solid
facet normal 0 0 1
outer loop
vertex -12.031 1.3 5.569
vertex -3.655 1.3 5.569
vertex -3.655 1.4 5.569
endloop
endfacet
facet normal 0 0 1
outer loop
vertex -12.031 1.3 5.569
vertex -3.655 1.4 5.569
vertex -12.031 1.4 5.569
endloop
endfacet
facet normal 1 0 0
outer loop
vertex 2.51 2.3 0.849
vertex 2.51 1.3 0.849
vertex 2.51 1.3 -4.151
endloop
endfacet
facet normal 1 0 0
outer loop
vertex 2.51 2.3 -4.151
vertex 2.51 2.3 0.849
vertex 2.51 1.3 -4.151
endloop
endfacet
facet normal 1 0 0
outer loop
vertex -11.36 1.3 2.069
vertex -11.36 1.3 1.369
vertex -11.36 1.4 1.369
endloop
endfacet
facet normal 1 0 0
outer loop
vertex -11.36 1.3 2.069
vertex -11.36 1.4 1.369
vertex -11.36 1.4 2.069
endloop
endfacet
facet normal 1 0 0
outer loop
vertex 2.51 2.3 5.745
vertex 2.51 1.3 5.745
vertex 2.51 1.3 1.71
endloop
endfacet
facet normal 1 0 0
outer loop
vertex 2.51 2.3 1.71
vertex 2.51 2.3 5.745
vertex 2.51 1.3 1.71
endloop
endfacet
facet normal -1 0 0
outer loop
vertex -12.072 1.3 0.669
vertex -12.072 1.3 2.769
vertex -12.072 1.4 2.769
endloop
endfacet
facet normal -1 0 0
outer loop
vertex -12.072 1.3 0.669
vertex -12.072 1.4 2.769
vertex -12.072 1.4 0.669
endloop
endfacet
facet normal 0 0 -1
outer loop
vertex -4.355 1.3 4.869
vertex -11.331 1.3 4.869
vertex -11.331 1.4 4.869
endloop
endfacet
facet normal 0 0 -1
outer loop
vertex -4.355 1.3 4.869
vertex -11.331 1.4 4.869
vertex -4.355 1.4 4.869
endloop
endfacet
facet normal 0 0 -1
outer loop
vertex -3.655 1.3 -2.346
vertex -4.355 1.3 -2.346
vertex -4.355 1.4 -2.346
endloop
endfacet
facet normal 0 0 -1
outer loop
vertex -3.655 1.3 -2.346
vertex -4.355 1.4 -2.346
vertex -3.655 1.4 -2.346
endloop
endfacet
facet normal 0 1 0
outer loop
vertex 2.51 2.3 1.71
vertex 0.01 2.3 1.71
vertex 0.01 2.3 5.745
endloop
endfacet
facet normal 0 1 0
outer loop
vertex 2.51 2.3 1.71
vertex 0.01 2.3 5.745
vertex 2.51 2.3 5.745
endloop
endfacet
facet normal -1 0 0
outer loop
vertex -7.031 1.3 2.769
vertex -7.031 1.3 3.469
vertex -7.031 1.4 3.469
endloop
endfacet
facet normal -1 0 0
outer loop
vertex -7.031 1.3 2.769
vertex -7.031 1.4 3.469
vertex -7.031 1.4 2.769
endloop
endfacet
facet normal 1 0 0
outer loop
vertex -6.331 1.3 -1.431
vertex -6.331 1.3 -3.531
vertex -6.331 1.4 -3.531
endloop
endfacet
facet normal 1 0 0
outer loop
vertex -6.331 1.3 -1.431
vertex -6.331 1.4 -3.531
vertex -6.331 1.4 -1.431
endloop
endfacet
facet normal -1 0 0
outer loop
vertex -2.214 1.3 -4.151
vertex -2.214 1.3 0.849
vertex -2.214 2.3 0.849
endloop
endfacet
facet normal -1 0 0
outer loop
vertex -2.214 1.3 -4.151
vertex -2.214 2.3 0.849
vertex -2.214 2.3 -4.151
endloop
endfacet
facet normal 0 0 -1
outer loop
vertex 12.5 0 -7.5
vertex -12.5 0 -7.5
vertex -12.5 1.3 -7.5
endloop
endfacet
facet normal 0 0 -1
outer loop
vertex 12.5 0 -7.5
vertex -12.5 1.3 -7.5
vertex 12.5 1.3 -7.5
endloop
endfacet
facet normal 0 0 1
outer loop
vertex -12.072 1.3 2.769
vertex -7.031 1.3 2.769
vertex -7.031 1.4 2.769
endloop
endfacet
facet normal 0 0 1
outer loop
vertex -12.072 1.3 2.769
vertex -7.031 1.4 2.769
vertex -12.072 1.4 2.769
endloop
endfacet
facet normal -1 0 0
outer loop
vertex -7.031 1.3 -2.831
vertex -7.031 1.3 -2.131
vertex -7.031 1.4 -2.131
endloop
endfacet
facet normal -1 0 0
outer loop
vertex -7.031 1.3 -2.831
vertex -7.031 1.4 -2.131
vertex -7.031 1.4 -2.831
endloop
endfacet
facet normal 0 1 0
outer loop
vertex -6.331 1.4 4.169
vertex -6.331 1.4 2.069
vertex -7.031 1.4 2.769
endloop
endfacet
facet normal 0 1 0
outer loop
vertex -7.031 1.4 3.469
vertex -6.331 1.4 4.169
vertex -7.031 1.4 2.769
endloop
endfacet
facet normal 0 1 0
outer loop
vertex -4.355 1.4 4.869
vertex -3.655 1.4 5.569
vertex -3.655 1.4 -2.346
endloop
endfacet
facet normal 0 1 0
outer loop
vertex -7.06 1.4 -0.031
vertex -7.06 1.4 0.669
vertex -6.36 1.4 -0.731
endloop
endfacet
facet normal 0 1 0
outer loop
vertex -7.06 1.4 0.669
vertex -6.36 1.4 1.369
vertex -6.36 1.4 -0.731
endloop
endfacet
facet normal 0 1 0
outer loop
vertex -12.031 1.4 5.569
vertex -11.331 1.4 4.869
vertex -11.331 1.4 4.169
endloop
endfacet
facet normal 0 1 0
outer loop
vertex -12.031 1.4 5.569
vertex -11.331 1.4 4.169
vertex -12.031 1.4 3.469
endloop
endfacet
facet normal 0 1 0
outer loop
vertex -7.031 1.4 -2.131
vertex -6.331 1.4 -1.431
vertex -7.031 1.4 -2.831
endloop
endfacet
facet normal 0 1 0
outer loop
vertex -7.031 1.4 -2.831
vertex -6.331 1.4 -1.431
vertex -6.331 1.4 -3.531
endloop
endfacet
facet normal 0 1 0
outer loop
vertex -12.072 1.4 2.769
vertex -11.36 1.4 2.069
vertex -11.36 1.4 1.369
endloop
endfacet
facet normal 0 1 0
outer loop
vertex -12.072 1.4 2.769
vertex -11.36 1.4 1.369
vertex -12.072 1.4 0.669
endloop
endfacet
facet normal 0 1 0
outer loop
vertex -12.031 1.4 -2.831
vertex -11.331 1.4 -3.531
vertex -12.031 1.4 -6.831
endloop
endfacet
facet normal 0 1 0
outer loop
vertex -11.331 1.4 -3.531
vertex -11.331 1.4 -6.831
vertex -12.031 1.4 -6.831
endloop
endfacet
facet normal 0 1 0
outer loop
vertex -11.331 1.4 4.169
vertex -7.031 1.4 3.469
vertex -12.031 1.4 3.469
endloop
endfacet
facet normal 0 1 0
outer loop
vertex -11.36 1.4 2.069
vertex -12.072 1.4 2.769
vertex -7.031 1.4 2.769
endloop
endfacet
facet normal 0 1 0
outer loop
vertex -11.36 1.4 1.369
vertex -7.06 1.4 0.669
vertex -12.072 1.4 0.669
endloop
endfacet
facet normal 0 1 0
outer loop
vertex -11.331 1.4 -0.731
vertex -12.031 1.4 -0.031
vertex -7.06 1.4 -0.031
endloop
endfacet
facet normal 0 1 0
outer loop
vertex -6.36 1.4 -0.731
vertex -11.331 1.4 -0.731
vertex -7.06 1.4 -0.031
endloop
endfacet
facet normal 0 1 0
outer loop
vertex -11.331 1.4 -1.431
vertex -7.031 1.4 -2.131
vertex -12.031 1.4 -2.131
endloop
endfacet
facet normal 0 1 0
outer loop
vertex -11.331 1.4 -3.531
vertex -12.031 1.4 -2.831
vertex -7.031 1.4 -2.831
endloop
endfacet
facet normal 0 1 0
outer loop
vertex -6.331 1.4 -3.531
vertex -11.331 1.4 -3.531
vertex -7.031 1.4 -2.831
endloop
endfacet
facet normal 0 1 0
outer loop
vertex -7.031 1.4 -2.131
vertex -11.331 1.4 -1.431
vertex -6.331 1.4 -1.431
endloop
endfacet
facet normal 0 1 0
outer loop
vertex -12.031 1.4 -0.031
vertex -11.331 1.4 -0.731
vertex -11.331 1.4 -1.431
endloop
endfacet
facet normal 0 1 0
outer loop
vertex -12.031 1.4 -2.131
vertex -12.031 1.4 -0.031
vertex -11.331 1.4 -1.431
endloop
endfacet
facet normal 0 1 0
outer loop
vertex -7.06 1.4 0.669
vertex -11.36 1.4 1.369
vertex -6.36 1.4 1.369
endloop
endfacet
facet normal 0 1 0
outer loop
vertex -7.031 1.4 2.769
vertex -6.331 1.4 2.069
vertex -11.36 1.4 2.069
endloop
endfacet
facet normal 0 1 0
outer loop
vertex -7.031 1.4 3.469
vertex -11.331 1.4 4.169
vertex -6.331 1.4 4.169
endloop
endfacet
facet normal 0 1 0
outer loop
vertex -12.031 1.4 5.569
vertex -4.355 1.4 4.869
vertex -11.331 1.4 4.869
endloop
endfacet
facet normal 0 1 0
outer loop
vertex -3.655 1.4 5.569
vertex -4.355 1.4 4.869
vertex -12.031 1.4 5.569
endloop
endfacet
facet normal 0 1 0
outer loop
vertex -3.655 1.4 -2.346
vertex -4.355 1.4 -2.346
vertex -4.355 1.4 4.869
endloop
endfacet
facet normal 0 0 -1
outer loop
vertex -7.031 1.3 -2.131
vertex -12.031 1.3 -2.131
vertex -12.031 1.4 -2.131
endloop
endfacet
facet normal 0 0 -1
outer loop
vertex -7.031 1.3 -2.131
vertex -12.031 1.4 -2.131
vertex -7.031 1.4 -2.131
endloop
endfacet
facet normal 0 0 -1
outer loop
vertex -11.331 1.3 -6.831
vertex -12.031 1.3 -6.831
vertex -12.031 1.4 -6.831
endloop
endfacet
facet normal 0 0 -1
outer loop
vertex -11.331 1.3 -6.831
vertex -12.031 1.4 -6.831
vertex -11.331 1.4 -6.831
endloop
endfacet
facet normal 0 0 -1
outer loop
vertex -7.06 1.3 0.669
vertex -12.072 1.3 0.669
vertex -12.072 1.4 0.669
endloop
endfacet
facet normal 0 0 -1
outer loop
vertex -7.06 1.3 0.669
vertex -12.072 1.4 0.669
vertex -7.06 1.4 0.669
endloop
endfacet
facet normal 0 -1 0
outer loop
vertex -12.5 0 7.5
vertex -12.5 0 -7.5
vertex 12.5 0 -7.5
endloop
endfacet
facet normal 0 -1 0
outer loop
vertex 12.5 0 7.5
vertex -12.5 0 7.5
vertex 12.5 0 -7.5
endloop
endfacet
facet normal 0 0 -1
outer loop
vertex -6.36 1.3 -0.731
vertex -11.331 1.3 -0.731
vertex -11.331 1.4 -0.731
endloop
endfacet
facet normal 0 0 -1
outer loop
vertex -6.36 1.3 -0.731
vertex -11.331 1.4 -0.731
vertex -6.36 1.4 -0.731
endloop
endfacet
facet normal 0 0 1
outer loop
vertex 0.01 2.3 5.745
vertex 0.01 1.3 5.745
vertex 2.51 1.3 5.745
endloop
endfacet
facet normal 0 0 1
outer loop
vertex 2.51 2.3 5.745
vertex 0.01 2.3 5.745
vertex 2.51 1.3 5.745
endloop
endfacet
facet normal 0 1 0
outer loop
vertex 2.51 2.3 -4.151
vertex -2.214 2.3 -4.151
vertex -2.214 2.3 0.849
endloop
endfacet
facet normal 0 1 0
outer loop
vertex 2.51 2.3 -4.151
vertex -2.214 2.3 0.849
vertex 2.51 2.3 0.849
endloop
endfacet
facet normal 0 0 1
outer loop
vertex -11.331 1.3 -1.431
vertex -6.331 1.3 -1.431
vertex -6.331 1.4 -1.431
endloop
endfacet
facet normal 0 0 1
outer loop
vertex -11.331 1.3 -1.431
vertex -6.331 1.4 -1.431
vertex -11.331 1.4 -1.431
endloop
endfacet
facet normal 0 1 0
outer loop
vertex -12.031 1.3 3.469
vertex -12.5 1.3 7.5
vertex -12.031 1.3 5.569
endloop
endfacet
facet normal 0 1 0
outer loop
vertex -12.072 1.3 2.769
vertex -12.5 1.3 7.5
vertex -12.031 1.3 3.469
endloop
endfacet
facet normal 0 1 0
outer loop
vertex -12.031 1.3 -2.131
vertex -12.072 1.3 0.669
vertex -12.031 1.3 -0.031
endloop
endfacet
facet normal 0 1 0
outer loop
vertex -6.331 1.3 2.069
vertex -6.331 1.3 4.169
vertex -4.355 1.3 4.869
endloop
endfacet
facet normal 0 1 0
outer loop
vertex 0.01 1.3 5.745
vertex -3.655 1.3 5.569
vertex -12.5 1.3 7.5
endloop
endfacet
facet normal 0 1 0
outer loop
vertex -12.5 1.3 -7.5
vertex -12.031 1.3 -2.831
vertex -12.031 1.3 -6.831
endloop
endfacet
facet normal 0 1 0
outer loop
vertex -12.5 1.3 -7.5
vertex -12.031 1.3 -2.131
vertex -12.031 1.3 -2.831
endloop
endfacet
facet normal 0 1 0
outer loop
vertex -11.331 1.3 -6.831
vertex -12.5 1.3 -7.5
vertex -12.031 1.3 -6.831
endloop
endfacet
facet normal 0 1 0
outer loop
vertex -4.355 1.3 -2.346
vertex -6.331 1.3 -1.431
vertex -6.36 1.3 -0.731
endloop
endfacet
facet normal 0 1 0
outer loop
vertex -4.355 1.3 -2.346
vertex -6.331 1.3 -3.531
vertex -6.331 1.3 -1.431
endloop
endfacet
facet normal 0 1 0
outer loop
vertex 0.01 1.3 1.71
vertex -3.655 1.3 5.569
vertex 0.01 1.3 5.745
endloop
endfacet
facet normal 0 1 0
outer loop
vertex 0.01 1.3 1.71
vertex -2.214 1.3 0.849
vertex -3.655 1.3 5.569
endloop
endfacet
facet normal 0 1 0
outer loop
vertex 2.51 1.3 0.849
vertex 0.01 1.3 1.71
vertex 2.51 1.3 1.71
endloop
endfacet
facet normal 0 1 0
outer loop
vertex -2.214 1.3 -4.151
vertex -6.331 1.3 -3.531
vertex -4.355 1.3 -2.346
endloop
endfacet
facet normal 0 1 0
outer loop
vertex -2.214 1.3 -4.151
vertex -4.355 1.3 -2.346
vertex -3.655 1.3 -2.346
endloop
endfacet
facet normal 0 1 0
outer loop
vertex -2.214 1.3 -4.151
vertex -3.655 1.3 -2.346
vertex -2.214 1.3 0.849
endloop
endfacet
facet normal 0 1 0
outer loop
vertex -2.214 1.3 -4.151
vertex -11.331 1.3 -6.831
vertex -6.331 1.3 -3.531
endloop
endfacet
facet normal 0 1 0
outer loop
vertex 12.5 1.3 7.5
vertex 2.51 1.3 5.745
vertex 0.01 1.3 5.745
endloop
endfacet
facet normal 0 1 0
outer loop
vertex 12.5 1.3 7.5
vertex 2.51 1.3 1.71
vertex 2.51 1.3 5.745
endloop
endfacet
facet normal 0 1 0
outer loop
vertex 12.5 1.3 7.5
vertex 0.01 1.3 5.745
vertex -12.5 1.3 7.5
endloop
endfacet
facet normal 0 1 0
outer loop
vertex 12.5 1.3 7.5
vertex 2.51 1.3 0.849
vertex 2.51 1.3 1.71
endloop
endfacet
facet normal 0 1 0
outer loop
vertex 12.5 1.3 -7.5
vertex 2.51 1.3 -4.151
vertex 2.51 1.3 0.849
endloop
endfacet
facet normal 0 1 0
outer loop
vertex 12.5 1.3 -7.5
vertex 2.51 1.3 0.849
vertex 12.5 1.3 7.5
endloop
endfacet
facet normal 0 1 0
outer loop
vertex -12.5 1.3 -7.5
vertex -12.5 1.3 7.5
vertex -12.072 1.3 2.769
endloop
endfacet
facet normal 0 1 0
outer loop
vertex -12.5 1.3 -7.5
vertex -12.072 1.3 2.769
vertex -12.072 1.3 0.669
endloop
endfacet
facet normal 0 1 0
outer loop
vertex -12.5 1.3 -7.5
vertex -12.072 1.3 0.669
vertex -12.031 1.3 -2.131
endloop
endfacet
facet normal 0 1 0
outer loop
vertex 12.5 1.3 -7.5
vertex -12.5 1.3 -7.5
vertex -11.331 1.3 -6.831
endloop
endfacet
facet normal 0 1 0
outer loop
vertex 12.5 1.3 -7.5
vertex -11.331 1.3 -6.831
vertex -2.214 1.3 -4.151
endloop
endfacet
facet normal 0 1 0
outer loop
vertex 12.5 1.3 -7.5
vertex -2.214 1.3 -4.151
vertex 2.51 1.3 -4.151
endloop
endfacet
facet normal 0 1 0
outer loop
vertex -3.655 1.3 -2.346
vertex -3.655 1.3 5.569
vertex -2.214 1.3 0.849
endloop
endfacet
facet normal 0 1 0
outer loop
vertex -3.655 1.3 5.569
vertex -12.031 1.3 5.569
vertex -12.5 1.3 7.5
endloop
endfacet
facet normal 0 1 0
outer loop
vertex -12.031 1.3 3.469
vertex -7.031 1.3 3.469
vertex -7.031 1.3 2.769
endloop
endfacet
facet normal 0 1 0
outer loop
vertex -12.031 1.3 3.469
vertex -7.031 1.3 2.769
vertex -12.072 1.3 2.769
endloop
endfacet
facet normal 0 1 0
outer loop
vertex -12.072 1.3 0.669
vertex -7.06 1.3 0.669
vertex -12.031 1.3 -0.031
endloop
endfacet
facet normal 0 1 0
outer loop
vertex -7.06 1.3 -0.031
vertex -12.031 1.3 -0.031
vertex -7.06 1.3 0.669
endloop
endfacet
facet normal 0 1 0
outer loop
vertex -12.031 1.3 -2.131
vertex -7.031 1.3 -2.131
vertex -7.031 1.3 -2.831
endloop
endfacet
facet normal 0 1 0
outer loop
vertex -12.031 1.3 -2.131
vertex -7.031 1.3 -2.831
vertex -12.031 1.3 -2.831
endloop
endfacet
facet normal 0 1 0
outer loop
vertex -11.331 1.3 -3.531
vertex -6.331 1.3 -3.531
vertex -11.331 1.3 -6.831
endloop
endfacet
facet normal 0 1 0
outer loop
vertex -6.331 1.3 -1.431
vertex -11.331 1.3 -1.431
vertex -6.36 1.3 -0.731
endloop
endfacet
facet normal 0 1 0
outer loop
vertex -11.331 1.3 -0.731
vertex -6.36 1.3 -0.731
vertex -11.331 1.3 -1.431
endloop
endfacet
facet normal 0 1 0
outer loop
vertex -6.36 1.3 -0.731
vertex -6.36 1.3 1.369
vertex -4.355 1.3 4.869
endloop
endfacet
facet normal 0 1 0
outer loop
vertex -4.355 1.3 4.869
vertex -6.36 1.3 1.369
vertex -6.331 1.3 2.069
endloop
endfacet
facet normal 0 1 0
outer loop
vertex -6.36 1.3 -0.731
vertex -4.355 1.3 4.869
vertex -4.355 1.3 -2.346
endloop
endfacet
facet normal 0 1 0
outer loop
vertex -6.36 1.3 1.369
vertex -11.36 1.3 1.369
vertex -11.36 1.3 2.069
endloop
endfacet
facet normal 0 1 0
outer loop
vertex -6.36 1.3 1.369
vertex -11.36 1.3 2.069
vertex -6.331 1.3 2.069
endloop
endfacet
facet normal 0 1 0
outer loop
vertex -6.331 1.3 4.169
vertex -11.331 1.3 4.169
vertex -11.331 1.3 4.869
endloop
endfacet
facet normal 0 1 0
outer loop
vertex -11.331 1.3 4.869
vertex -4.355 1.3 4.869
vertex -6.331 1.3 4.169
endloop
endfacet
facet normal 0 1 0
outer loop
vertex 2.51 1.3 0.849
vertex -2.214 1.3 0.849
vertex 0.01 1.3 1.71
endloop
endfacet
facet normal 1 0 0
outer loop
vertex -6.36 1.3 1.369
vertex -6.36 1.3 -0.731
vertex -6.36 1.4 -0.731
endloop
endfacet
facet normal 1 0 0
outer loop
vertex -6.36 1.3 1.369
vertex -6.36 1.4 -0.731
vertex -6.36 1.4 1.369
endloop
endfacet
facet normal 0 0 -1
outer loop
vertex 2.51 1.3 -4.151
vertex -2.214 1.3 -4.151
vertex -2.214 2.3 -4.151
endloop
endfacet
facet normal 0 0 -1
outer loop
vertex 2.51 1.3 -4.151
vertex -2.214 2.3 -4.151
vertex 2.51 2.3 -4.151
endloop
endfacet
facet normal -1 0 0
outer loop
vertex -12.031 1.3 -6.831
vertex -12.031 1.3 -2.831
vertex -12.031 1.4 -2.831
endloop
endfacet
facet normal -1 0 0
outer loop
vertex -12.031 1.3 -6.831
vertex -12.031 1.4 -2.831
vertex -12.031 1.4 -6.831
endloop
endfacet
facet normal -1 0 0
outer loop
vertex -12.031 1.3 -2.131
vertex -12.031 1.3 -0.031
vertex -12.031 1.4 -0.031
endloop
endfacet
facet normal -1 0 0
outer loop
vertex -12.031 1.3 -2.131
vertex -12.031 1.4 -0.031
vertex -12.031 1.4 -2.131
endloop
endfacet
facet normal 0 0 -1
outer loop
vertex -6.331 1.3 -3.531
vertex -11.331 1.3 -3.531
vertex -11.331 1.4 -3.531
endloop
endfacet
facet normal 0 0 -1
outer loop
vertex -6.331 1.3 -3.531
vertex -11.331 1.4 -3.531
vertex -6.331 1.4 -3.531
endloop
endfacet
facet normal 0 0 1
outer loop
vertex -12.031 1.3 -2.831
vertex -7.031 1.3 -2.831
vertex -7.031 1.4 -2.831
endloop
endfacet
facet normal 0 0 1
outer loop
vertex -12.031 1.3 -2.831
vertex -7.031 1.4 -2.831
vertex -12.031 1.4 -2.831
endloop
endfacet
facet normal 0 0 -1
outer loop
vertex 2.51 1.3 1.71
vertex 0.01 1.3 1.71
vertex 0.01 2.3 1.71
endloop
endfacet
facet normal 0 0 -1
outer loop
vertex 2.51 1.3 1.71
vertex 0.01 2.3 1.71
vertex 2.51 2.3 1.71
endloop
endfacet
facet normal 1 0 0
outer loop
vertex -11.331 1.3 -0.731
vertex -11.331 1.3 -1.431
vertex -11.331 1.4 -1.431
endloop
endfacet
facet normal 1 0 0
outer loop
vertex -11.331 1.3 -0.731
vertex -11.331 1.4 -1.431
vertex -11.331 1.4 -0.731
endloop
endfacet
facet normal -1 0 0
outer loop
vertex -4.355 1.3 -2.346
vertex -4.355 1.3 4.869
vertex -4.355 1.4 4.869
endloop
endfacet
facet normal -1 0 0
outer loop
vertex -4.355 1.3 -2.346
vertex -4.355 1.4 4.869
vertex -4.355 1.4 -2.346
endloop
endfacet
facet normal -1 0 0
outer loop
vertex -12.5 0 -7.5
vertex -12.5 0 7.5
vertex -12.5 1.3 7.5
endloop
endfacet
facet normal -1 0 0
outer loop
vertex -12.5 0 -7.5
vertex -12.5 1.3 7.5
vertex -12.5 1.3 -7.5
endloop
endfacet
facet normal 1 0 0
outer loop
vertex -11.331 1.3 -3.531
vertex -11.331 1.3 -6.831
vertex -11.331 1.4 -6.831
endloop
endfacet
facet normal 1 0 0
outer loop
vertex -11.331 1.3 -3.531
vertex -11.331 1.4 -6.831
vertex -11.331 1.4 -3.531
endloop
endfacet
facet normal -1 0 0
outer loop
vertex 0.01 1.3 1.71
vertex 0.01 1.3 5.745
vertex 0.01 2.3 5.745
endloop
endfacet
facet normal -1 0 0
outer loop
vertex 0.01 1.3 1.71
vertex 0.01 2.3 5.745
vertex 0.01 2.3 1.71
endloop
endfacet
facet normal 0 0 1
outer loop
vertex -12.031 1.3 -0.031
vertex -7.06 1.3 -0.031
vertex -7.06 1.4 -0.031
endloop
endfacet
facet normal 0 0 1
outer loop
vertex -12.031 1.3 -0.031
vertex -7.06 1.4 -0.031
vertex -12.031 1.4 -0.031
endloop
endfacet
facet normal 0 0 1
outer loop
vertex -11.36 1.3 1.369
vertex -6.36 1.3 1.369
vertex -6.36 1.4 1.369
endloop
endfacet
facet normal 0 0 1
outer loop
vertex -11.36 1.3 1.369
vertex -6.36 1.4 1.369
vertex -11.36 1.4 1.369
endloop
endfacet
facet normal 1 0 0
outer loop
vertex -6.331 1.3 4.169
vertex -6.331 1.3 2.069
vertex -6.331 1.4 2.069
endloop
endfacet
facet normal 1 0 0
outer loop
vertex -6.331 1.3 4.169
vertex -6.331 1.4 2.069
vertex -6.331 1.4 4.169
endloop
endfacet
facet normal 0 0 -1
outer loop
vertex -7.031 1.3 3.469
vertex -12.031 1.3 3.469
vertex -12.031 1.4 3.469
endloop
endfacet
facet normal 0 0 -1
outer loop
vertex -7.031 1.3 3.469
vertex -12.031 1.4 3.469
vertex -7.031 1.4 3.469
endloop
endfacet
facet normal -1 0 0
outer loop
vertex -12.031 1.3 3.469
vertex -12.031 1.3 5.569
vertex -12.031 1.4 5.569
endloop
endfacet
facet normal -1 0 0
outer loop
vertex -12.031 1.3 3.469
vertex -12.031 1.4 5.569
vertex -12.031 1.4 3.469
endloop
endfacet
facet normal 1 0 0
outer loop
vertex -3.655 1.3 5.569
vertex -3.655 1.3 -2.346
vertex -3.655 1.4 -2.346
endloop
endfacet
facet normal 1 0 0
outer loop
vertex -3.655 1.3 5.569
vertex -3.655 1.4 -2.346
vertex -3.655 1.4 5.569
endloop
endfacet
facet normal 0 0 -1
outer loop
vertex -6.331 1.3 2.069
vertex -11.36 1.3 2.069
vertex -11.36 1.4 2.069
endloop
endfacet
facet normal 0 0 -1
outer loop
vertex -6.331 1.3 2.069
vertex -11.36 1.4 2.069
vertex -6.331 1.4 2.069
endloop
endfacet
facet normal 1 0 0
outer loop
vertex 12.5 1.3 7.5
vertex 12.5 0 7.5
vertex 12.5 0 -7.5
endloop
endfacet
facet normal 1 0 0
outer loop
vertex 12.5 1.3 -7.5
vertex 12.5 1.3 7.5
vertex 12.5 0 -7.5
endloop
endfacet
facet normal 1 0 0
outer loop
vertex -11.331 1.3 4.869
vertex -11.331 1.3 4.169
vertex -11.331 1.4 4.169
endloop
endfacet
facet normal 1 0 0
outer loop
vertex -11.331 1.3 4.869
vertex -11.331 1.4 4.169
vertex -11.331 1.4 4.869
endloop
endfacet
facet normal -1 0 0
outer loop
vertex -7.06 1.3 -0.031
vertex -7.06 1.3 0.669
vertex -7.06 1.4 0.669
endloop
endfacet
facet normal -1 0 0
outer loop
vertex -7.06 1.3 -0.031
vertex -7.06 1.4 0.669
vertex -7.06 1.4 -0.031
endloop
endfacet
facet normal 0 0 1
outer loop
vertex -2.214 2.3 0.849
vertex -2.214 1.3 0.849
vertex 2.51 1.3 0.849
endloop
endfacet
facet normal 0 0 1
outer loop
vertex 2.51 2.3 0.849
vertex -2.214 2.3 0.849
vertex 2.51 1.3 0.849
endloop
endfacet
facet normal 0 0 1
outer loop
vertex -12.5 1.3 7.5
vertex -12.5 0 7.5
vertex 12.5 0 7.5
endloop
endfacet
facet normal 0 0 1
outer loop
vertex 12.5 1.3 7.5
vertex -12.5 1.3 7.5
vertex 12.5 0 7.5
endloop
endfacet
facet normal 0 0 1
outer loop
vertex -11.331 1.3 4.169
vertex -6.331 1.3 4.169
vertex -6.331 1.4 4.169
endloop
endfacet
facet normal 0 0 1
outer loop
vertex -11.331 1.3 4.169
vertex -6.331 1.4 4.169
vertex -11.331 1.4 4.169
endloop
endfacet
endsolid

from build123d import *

# Parameters (mm, degrees)
SKETCH1_W           = 25
SKETCH1_H           = 15
BOSS_EXTRUDE1_DEPTH = 1.3
BOSS_EXTRUDE2_DEPTH = 0.1
SKETCH3_W           = 4.723765288
SKETCH3_H           = 5
SKETCH3_W_2         = 2.5
SKETCH3_H_2         = 4.03488285
BOSS_EXTRUDE3_DEPTH = 1


with BuildPart() as part:
    # Sketch1 → Boss-Extrude1 (new body)
    with BuildSketch(Plane(origin=(0, 0, 0), x_dir=(1, 0, 0), z_dir=(0, 1, 0))):
        Rectangle(SKETCH1_W, SKETCH1_H)
    extrude(amount=BOSS_EXTRUDE1_DEPTH)

    # Sketch2 → Boss-Extrude2 (add)
    with BuildSketch(Plane(origin=(0, 1.3, 0), x_dir=(1, 0, 0), z_dir=(0, 1, 0))):
        Polygon((-3.654721125, -5.569339468), (-12.030839718, -5.569339468), (-12.030839718, -3.469339468), (-7.030839718, -3.469339468), (-7.030839718, -2.769339468), (-12.071748872, -2.769339468), (-12.071748872, -0.669339468), (-7.060469733, -0.669339468), (-7.060469733, 0.030660532), (-12.030839718, 0.030660532), (-12.030839718, 2.130660532), (-7.030839718, 2.130660532), (-7.030839718, 2.830660532), (-12.030839718, 2.830660532), (-12.030839718, 6.830660532), (-11.330839718, 6.830660532), (-11.330839718, 3.530660532), (-6.330839718, 3.530660532), (-6.330839718, 1.430660532), (-11.330839718, 1.430660532), (-11.330839718, 0.730660532), (-6.360469733, 0.730660532), (-6.360469733, -1.369339468), (-11.360469733, -1.369339468), (-11.360469733, -2.069339468), (-6.330839718, -2.069339468), (-6.330839718, -4.169339468), (-11.330839718, -4.169339468), (-11.330839718, -4.869339468), (-4.354721125, -4.869339468), (-4.354721125, 2.346150012), (-3.654721125, 2.346150012), align=None)
    extrude(amount=BOSS_EXTRUDE2_DEPTH)

    # Sketch3 → Boss-Extrude3 (add)
    with BuildSketch(Plane(origin=(0, 1.3, 0), x_dir=(1, 0, 0), z_dir=(0, 1, 0))):
        with Locations((0.147617665, 1.651198425)):
            Rectangle(SKETCH3_W, SKETCH3_H)
        with Locations((1.259500309, -3.727346048)):
            Rectangle(SKETCH3_W_2, SKETCH3_H_2)
    extrude(amount=BOSS_EXTRUDE3_DEPTH)


solid = part.part
